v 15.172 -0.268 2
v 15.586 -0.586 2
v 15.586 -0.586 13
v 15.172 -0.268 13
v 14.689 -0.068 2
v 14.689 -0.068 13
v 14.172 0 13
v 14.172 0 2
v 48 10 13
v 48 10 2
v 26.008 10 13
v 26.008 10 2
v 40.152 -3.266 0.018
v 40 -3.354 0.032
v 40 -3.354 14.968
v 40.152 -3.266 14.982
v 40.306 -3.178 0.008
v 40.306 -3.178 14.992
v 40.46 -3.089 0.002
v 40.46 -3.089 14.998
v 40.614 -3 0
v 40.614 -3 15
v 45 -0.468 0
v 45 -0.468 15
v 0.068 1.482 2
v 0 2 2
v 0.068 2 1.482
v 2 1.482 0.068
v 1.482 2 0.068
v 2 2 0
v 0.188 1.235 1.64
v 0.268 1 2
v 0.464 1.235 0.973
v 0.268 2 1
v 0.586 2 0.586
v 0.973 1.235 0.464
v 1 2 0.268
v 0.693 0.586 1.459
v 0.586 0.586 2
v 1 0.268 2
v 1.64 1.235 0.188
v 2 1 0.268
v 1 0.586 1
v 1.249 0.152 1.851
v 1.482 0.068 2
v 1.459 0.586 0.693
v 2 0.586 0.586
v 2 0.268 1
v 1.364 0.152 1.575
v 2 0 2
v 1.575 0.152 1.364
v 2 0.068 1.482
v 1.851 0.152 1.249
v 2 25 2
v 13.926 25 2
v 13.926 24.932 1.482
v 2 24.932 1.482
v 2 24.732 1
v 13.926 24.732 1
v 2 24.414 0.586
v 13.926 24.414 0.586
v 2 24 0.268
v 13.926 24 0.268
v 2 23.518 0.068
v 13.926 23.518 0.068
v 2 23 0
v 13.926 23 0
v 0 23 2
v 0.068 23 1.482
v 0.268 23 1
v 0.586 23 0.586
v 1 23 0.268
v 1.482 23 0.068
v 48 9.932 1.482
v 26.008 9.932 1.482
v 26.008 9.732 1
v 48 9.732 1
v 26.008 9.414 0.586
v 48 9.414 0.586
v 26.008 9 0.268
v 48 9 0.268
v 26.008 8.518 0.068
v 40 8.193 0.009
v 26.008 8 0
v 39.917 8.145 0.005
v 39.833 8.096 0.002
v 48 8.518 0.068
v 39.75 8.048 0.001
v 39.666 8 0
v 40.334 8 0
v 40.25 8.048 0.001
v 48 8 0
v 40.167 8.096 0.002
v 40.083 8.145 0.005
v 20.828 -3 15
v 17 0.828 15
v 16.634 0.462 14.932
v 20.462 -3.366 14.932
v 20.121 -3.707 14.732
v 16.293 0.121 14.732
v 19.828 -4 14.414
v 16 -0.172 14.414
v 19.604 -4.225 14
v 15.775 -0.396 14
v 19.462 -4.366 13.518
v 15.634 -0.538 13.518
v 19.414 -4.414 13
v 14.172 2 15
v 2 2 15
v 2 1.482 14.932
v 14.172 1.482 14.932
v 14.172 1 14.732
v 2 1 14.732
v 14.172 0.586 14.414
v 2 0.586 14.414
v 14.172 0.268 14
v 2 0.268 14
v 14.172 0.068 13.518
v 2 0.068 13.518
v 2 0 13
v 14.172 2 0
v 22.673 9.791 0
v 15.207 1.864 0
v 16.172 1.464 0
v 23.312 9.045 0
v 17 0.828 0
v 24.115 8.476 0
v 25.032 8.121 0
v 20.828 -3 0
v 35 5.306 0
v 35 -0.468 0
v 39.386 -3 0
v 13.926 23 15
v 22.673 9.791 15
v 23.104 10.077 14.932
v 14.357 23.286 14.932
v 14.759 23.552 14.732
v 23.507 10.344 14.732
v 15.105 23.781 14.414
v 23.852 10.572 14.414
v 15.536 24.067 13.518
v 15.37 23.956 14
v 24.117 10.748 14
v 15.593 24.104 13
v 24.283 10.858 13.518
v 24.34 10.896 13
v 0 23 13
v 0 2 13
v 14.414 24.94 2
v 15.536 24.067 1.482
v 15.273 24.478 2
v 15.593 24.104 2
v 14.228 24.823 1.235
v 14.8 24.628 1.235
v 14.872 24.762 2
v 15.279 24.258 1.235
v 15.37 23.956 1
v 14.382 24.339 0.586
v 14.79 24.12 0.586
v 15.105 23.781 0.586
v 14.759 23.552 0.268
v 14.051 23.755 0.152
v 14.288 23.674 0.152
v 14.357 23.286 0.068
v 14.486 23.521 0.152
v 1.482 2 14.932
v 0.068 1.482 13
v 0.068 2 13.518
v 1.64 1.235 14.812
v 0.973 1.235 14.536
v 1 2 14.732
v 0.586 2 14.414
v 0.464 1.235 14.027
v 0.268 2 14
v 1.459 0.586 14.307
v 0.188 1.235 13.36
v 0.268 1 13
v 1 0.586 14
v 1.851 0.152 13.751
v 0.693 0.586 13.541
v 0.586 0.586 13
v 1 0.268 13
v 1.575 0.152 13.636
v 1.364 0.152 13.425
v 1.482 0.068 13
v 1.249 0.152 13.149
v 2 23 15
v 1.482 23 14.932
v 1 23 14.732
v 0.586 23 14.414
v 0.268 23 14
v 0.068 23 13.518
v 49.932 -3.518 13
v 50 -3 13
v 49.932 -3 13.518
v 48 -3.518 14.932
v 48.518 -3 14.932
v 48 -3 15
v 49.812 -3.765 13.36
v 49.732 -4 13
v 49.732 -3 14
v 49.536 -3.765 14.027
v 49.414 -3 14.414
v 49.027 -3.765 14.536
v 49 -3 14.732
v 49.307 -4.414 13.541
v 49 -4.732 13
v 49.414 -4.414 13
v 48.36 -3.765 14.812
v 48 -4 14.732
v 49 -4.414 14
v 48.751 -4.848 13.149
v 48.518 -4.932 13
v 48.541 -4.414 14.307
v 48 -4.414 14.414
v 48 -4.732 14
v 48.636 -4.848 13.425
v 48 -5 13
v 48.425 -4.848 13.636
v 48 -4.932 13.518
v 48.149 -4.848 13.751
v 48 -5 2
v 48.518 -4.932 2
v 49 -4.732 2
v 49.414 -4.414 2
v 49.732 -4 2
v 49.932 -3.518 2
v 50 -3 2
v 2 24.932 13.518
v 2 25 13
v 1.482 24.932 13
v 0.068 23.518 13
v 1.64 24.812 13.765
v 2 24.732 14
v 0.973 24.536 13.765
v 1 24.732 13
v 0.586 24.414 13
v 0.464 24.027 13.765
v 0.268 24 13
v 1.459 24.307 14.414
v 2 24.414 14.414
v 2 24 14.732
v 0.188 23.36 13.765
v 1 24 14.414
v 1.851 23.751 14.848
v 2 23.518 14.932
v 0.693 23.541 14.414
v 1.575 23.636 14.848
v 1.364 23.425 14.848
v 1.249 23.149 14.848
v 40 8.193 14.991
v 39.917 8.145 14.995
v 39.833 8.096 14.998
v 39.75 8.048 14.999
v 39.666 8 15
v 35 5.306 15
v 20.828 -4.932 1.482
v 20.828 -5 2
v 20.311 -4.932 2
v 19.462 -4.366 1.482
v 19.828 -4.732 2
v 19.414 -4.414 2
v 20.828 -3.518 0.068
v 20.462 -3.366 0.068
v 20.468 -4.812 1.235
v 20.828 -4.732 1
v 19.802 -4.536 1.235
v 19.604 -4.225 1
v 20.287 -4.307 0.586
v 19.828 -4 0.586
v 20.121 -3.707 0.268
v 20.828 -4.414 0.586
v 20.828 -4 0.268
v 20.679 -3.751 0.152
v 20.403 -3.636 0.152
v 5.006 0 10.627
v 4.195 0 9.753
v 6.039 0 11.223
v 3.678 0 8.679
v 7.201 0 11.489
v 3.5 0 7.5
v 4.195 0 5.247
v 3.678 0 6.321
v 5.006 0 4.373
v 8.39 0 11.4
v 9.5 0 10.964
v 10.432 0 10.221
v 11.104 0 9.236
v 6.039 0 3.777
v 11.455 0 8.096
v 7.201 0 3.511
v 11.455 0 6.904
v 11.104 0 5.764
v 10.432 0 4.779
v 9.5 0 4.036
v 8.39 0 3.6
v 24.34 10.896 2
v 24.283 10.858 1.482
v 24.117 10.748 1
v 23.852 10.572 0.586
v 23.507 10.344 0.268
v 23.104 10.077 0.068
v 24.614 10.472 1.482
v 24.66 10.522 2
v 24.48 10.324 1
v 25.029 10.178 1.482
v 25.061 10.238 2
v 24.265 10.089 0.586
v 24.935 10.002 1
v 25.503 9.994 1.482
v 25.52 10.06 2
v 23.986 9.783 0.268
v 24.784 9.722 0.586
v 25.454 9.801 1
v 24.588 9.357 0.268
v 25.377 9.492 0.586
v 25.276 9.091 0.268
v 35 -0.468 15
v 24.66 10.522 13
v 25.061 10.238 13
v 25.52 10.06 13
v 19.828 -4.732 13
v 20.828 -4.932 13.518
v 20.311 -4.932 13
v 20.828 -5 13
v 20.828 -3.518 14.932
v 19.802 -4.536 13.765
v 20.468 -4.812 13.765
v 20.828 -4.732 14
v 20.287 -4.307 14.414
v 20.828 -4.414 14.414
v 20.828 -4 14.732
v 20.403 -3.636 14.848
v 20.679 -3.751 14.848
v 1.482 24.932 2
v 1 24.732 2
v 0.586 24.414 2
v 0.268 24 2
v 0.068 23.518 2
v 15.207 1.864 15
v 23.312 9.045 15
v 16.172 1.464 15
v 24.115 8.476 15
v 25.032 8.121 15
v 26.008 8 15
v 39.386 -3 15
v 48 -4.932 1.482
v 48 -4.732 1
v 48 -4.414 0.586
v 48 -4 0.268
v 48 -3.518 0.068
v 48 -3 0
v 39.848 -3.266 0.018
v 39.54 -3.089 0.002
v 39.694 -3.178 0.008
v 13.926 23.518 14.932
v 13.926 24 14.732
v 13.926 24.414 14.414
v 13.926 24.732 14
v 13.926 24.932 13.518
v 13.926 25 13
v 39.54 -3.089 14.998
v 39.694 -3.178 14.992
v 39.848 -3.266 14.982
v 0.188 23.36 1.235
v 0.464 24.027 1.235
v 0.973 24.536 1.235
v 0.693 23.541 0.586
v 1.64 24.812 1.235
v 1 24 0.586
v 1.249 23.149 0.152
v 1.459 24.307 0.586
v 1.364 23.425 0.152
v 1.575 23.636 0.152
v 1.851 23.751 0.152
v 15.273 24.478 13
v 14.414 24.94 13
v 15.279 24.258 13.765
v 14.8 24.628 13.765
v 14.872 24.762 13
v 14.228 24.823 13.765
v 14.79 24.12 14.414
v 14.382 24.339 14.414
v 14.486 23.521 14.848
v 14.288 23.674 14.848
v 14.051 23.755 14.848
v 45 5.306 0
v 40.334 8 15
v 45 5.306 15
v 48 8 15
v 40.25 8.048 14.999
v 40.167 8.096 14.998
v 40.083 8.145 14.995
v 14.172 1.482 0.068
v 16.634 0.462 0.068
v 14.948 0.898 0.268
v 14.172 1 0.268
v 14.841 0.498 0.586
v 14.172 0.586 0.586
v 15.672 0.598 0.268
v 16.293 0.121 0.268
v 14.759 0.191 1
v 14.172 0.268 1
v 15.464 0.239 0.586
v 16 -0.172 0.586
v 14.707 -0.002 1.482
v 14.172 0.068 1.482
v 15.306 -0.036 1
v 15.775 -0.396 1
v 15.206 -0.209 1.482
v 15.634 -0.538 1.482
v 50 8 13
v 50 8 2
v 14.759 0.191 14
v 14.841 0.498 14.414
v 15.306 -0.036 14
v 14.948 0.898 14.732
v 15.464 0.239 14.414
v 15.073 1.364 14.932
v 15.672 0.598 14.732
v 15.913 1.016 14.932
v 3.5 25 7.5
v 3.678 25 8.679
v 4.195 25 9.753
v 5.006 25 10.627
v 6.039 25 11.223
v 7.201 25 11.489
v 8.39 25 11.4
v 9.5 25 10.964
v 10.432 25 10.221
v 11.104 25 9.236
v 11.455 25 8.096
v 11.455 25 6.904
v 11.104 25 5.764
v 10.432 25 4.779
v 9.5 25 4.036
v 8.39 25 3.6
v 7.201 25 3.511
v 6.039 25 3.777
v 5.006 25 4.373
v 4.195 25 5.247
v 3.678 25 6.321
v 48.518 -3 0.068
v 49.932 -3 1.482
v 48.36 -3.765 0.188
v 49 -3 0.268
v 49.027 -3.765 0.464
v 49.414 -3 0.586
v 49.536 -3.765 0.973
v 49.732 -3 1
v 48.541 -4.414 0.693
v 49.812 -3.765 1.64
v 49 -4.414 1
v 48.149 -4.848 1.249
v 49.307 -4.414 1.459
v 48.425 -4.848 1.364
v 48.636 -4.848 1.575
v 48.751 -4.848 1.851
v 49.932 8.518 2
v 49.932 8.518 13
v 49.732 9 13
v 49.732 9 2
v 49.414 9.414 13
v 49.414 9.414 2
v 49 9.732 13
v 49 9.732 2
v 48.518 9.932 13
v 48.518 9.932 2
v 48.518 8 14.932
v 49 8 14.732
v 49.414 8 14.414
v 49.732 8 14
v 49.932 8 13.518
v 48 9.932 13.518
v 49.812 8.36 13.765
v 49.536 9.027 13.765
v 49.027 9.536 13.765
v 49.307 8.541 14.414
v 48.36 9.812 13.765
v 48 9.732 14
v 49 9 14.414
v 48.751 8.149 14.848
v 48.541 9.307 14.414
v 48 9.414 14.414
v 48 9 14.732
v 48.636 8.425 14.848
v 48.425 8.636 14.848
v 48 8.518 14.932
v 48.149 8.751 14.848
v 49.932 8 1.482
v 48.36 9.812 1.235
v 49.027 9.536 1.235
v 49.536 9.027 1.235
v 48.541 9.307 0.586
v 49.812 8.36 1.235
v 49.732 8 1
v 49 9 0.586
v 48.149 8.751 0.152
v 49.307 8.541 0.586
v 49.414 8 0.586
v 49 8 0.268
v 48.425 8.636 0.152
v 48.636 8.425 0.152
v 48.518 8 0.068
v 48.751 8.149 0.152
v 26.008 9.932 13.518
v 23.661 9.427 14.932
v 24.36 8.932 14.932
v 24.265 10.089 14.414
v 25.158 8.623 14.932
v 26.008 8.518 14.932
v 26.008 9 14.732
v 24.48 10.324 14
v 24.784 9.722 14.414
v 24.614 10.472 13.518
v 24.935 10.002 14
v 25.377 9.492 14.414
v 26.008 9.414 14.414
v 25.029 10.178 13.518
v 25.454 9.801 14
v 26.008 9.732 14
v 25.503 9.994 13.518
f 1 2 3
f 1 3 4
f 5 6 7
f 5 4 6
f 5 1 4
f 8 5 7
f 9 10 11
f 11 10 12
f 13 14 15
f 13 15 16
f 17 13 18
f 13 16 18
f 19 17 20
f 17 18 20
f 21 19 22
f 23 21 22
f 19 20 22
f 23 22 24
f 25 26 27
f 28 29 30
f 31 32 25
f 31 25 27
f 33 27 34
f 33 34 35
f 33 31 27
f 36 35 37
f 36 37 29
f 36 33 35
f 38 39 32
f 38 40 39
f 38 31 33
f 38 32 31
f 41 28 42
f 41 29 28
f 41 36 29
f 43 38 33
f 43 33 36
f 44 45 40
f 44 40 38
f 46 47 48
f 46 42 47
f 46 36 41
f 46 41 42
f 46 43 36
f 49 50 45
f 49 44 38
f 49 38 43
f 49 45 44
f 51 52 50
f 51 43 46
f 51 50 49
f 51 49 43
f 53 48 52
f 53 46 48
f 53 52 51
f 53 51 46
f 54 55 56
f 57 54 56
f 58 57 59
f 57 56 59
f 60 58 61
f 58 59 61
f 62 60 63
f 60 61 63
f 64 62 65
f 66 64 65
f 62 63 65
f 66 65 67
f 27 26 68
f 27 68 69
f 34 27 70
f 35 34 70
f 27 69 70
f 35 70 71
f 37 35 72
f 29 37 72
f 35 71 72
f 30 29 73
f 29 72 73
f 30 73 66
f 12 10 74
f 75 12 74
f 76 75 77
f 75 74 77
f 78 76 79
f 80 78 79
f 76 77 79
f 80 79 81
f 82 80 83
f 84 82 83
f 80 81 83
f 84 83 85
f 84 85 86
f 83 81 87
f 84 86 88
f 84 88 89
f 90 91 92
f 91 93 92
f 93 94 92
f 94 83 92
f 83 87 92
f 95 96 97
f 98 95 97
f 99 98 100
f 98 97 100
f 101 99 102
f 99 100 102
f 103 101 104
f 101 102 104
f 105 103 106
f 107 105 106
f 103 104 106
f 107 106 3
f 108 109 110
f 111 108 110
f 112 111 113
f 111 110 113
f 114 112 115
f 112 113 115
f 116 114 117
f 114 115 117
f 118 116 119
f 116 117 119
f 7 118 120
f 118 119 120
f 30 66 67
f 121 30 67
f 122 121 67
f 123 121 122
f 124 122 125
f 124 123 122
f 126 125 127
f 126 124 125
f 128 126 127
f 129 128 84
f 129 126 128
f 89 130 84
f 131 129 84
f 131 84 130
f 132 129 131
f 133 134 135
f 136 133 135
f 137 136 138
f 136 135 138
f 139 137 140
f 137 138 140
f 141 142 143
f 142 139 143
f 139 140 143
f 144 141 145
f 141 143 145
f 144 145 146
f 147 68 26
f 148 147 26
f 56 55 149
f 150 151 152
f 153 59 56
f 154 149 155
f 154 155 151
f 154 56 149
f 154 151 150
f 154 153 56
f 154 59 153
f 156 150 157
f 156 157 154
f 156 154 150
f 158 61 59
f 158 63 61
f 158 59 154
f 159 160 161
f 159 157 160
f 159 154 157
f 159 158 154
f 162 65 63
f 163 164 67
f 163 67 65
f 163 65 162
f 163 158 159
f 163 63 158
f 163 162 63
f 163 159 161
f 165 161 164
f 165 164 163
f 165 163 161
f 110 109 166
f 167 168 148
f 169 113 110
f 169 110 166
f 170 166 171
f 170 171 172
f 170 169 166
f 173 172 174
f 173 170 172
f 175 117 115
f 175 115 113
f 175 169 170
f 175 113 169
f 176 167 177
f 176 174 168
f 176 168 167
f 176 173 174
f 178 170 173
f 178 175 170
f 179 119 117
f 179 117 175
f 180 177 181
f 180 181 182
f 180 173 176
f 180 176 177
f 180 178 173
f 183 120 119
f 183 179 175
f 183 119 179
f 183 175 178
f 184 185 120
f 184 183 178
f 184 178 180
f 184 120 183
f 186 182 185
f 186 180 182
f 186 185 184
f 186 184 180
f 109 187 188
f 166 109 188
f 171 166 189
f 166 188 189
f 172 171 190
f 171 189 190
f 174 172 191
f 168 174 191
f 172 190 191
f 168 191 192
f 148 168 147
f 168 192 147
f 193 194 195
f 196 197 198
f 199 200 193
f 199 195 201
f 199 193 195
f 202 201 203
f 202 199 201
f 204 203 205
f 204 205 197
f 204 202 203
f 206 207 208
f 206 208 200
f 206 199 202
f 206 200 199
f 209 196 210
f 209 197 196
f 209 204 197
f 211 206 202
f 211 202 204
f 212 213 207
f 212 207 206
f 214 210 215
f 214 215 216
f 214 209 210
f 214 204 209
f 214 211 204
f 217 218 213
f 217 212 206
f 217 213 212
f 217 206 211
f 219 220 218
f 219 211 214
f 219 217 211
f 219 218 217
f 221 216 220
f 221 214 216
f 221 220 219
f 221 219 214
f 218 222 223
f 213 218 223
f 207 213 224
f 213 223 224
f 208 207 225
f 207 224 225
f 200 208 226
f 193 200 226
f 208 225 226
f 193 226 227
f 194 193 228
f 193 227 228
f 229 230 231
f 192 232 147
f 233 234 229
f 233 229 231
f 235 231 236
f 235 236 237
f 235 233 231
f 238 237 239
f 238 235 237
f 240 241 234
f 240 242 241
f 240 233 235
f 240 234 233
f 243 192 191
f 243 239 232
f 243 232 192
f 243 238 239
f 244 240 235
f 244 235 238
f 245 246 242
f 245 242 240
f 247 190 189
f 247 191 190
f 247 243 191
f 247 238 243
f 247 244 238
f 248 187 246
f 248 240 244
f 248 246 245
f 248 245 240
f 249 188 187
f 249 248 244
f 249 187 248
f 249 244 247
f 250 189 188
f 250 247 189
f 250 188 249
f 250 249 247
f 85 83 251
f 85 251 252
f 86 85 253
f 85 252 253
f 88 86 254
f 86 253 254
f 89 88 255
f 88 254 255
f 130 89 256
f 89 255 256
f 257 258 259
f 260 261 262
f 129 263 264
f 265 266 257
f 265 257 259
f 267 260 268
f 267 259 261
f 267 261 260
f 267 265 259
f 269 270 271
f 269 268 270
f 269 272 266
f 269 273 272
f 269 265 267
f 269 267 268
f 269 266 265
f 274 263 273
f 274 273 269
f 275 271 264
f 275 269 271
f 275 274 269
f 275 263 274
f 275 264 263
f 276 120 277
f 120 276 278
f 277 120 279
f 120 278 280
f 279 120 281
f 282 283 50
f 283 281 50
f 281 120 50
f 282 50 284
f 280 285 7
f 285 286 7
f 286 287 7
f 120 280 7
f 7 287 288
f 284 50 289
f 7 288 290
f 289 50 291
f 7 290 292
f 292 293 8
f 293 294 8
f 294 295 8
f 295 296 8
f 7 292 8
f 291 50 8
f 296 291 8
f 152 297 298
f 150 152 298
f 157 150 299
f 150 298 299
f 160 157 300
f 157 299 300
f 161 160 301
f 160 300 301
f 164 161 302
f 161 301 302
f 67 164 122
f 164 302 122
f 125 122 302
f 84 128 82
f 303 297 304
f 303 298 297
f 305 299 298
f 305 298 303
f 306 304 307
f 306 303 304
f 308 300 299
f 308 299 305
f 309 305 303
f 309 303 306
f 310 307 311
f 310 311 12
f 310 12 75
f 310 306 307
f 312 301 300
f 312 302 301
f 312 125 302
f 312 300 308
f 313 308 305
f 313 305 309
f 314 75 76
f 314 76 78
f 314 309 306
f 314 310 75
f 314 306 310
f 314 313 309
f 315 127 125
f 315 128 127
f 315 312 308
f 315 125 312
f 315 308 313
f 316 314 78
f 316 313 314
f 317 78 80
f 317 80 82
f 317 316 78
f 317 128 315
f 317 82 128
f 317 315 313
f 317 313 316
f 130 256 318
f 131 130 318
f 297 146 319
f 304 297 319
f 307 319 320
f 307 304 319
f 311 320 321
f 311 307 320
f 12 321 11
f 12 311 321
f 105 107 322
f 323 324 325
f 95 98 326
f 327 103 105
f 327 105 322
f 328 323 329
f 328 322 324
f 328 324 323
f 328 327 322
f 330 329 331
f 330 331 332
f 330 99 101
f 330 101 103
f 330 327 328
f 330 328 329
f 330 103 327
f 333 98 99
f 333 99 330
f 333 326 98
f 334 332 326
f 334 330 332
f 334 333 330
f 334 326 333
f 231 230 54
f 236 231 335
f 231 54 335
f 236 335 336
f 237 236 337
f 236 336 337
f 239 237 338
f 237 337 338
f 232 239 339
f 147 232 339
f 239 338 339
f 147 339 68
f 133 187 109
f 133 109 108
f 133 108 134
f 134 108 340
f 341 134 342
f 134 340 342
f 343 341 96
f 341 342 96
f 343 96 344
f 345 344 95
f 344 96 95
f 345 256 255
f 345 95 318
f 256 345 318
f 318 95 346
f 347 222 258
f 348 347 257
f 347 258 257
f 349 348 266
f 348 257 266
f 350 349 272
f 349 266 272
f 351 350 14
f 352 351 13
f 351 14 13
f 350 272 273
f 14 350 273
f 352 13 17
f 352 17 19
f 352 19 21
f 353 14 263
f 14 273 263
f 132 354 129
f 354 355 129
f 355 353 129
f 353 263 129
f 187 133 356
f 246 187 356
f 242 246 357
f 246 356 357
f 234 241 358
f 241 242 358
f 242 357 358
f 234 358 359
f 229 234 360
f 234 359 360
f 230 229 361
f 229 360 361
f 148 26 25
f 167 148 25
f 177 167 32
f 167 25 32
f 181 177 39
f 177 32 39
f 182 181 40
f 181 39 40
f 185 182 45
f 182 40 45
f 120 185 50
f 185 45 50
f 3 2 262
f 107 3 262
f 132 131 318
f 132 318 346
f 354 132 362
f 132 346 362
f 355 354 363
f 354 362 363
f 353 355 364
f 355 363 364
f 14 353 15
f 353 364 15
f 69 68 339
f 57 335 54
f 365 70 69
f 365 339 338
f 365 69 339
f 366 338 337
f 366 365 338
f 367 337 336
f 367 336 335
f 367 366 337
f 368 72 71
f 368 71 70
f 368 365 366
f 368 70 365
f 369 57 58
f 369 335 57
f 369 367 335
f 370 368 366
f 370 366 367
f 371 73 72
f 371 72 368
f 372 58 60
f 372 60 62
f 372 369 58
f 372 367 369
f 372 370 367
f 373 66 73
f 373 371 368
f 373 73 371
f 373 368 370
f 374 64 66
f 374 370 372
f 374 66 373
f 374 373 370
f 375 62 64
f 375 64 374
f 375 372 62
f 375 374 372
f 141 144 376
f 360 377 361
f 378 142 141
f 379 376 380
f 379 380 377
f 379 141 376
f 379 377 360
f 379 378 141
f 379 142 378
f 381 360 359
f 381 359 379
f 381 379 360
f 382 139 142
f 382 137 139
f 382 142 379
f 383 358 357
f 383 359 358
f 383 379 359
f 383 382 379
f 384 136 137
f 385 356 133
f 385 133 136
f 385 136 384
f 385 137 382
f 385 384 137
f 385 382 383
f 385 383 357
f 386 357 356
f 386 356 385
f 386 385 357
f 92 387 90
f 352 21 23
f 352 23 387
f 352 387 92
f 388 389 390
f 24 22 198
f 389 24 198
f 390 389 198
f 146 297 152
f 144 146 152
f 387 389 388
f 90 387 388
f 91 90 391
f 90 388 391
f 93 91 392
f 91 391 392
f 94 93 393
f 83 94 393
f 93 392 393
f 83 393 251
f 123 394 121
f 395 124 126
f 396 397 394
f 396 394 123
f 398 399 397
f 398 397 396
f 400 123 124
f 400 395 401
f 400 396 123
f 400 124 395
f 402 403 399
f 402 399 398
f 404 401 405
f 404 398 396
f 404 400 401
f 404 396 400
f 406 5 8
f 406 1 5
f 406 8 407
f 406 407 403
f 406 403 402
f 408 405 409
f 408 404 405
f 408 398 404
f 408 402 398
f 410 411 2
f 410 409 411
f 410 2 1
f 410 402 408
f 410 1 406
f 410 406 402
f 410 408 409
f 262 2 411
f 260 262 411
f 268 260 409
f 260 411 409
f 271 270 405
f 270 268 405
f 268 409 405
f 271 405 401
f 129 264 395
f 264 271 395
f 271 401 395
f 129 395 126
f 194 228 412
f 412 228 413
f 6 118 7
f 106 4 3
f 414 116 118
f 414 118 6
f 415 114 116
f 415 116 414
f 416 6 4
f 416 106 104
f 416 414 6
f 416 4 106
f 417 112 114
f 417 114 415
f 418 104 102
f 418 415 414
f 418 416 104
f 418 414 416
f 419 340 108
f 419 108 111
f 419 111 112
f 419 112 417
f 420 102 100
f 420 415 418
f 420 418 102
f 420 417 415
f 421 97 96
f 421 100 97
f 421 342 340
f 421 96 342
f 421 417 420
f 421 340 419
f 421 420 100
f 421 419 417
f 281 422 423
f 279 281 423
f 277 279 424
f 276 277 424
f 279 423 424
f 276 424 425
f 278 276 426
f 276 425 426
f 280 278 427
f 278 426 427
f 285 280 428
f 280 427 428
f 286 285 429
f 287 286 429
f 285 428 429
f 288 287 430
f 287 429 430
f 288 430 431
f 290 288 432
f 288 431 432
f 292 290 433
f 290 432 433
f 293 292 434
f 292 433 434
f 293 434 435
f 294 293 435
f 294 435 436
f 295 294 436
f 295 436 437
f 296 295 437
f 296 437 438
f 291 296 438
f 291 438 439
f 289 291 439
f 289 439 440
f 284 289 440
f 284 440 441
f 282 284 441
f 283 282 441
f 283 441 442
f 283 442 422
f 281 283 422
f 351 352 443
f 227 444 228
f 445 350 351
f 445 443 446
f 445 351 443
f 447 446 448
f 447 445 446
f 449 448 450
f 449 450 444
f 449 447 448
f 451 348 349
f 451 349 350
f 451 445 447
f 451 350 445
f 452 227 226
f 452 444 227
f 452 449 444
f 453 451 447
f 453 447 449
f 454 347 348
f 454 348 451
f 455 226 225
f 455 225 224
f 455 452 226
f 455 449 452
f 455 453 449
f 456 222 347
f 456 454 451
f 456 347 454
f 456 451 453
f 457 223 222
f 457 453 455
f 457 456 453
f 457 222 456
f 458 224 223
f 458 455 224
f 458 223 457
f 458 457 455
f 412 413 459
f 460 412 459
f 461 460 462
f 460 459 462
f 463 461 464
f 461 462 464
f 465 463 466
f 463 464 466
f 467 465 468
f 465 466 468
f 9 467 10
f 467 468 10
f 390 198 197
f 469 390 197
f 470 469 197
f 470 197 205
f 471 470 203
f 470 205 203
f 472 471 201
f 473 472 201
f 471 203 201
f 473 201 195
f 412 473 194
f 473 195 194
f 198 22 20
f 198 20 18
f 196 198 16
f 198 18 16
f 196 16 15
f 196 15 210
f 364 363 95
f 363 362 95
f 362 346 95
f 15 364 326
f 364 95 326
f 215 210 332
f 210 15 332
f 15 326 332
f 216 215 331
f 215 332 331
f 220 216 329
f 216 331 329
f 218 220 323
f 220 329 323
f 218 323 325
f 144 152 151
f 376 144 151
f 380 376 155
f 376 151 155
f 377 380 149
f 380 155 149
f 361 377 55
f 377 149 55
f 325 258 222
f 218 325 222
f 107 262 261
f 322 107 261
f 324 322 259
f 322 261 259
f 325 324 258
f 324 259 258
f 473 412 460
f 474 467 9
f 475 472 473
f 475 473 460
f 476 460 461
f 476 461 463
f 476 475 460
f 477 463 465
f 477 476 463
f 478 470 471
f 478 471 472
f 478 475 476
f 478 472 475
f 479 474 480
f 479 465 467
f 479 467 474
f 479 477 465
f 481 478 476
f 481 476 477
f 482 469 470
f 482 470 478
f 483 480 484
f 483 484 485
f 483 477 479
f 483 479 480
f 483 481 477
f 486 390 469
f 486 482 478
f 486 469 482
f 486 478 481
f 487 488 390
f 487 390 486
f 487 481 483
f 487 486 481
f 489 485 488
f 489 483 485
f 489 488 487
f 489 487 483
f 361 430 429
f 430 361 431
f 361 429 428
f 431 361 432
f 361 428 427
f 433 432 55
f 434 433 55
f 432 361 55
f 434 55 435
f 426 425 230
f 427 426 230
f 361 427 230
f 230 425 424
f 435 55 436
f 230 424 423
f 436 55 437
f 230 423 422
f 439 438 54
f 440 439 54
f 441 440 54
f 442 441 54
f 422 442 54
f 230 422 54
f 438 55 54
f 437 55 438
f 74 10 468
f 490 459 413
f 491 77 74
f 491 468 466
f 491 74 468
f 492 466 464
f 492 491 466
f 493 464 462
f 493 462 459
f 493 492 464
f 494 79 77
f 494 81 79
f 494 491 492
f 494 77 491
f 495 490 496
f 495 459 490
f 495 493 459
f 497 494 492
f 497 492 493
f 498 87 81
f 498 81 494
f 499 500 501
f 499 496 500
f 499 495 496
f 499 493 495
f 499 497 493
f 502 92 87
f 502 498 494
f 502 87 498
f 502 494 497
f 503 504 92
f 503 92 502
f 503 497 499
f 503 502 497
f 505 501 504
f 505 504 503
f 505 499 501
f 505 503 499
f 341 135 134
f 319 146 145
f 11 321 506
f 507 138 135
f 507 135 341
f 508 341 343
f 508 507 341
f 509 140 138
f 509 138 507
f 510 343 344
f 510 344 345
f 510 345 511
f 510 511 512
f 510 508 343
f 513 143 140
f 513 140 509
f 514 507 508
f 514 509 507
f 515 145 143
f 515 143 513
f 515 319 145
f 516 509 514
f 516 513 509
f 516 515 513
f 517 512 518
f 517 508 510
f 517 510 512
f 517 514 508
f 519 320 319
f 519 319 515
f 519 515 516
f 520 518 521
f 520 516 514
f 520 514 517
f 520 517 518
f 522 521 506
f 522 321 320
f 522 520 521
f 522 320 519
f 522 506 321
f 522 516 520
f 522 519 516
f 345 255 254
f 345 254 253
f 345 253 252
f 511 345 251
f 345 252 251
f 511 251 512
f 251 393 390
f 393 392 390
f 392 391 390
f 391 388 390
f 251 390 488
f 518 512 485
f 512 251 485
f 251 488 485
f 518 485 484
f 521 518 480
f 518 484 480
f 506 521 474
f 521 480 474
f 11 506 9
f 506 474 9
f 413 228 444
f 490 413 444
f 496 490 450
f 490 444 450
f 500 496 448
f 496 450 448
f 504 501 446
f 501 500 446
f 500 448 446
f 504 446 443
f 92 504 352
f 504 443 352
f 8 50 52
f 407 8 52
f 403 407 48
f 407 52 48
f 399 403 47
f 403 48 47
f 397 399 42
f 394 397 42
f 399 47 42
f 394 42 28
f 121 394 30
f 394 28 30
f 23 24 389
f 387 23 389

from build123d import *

# Parameters (mm, degrees)
BOSS_EXTRUDE1_DEPTH = 15
SKETCH2_R           = 4.000000000000001
CUT_EXTRUDE1_DEPTH  = 61.20797289396146
CUT_EXTRUDE2_DEPTH  = 15
FILLET1_R           = 2


with BuildPart() as part:
    # Sketch1 → Boss-Extrude1 (new body)
    with BuildSketch(Plane.XY):
        Polygon((0, 0), (15, 0), (19.999999999999982, -5), (49.99999999999999, -5), (49.999999999999986, 10.000000000000002), (24.93349002823336, 9.999999999999998), (15, 24.999999999999993), (0, 24.999999999999996), align=None)
    extrude(amount=BOSS_EXTRUDE1_DEPTH)

    # Sketch2 → Cut-Extrude1 (cut, through all)
    with BuildSketch(Plane(origin=(5.78e-15, 24.999999999999996, 0), x_dir=(1, -2.3e-16, 0), z_dir=(2.3e-16, 1, 0))):
        with Locations(Location((7.499999999999995, -7.5, 0), (0, 0, 180))):
            Circle(SKETCH2_R)
    extrude(amount=-CUT_EXTRUDE1_DEPTH, mode=Mode.SUBTRACT)

    # Sketch3 → Cut-Extrude2 (cut)
    with BuildSketch(Plane.XY.offset(15)):
        Polygon((45, -0.4675632330808986), (45, 5.305939458815377), (39.99999999999999, 8.192690804763508), (34.999999999999986, 5.305939458815372), (34.999999999999986, -0.46756323308090486), (39.999999999999986, -3.354314579029036), align=None)
    extrude(amount=-CUT_EXTRUDE2_DEPTH, mode=Mode.SUBTRACT)

    # Fillet1
    # the kernel refuses this fillet: 2 mm, written as the material it adds along each edge
    with BuildSketch(Plane(origin=(24.93349002823336, 9.999999999999998, 0), x_dir=(-0.5521382091872268, 0.8337525999692728, 0), z_dir=(0, 0, 1))) as fillet1_piece_1:
        with BuildLine():
            CenterArc((FILLET1_R * 0.537163891098, -FILLET1_R), FILLET1_R, 90.00000000000004, 56.486172927445)
            Line((-FILLET1_R * 0.296588708871, -FILLET1_R * 0.447861790813), (0, 0))
            Line((0, 0), (FILLET1_R * 0.537163891098, -7e-17))
        make_face()
    extrude(amount=15)
    with BuildSketch(Plane(origin=(15, 0, 0), x_dir=(-1, 0, 0), z_dir=(0, 0, 1))) as fillet1_piece_2:
        with BuildLine():
            CenterArc((FILLET1_R * 0.414213562373, FILLET1_R), FILLET1_R, 224.99999999999994, 45.00000000000006)
            Line((-FILLET1_R * 0.292893218813, FILLET1_R * 0.292893218813), (0, 0))
            Line((0, 0), (FILLET1_R * 0.414213562373, 0))
        make_face()
    extrude(amount=15)
    # the kernel refuses this fillet: 2 mm, written as the material it takes off along each edge
    with BuildSketch(Plane(origin=(2, 2, 13), x_dir=(0, 0, 1), z_dir=(0, -1, 0))) as fillet1_2_piece_1_section:
        Polygon((0, 0), (FILLET1_R, 0), (FILLET1_R, FILLET1_R), (0, FILLET1_R), align=None)
    fillet1_2_piece_1 = extrude(amount=FILLET1_R, mode=Mode.PRIVATE)
    fillet1_2_piece_1 = fillet1_2_piece_1 - Plane(origin=(2, 2, 13), x_dir=(0.7071067811865475, 0, -0.7071067811865475), z_dir=(0, -1, 0)) * Sphere(FILLET1_R, mode=Mode.PRIVATE)
    add(fillet1_2_piece_1, mode=Mode.SUBTRACT)
    with BuildSketch(Plane(origin=(2, 22.999999999999996, 2), x_dir=(-1, 0, 0), z_dir=(0, 0, -1))) as fillet1_2_piece_2_section:
        Polygon((0, 0), (FILLET1_R, 0), (FILLET1_R, FILLET1_R), (-4.7e-16, FILLET1_R), align=None)
    fillet1_2_piece_2 = extrude(amount=FILLET1_R, mode=Mode.PRIVATE)
    fillet1_2_piece_2 = fillet1_2_piece_2 - Plane(origin=(2, 22.999999999999996, 2), x_dir=(0.7071067811865475, -0.7071067811865476, 0), z_dir=(0, 0, -1)) * Sphere(FILLET1_R, mode=Mode.PRIVATE)
    add(fillet1_2_piece_2, mode=Mode.SUBTRACT)
    with BuildSketch(Plane(origin=(2, 2, 2), x_dir=(0, 0, -1), z_dir=(0, -1, 0))) as fillet1_2_piece_3_section:
        Polygon((0, 0), (FILLET1_R, 0), (FILLET1_R, -FILLET1_R), (0, -FILLET1_R), align=None)
    fillet1_2_piece_3 = extrude(amount=FILLET1_R, mode=Mode.PRIVATE)
    fillet1_2_piece_3 = fillet1_2_piece_3 - Plane(origin=(2, 2, 2), x_dir=(0.7071067811865475, 0, 0.7071067811865475), z_dir=(0, -1, 0)) * Sphere(FILLET1_R, mode=Mode.PRIVATE)
    add(fillet1_2_piece_3, mode=Mode.SUBTRACT)
    with BuildSketch(Plane(origin=(13.92567221780351, 22.999999999999993, 2), x_dir=(0.8337525999692725, 0.5521382091872273, 0), z_dir=(0, 0, -1))) as fillet1_2_piece_4_section:
        Polygon((0, 0), (FILLET1_R, -3e-17), (FILLET1_R, -FILLET1_R * 0.537163891098), (FILLET1_R * 0.552138209187, -FILLET1_R * 0.833752599969), align=None)
    fillet1_2_piece_4 = extrude(amount=FILLET1_R, mode=Mode.PRIVATE)
    fillet1_2_piece_4 = fillet1_2_piece_4 - Plane(origin=(13.92567221780351, 22.999999999999993, 2), x_dir=(-0.47321337196489544, -0.8809478444230473, 0), z_dir=(0, 0, -1)) * Sphere(FILLET1_R, mode=Mode.PRIVATE)
    add(fillet1_2_piece_4, mode=Mode.SUBTRACT)
    with BuildSketch(Plane(origin=(20.828427124746174, -3, 13), x_dir=(-0.7071067811865488, -0.7071067811865462, 0), z_dir=(0, 0, 1))) as fillet1_2_piece_5_section:
        Polygon((0, 0), (FILLET1_R, -2e-17), (FILLET1_R, FILLET1_R * 0.414213562373), (FILLET1_R * 0.707106781187, FILLET1_R * 0.707106781187), align=None)
    fillet1_2_piece_5 = extrude(amount=FILLET1_R, mode=Mode.PRIVATE)
    fillet1_2_piece_5 = fillet1_2_piece_5 - Plane(origin=(20.828427124746174, -3, 13), x_dir=(0.3826834323650906, 0.9238795325112864, 0), z_dir=(0, 0, 1)) * Sphere(FILLET1_R, mode=Mode.PRIVATE)
    add(fillet1_2_piece_5, mode=Mode.SUBTRACT)
    with BuildSketch(Plane(origin=(13.925672217803509, 22.999999999999996, 13), x_dir=(2.4e-16, 1, 0), z_dir=(0, 0, 1))) as fillet1_2_piece_6_section:
        Polygon((0, 0), (FILLET1_R, 0), (FILLET1_R, -FILLET1_R * 0.537163891098), (FILLET1_R * 0.552138209187, -FILLET1_R * 0.833752599969), align=None)
    fillet1_2_piece_6 = extrude(amount=FILLET1_R, mode=Mode.PRIVATE)
    fillet1_2_piece_6 = fillet1_2_piece_6 - Plane(origin=(13.925672217803509, 22.999999999999996, 13), x_dir=(-0.47321337196489544, -0.8809478444230473, 0), z_dir=(0, 0, 1)) * Sphere(FILLET1_R, mode=Mode.PRIVATE)
    add(fillet1_2_piece_6, mode=Mode.SUBTRACT)
    with BuildSketch(Plane(origin=(47.999999999999986, 8.000000000000002, 2), x_dir=(1, 4.7e-16, 0), z_dir=(0, 0, -1))) as fillet1_2_piece_7_section:
        Polygon((0, 0), (FILLET1_R, 0), (FILLET1_R, -FILLET1_R), (6.6e-16, -FILLET1_R), align=None)
    fillet1_2_piece_7 = extrude(amount=FILLET1_R, mode=Mode.PRIVATE)
    fillet1_2_piece_7 = fillet1_2_piece_7 - Plane(origin=(47.999999999999986, 8.000000000000002, 2), x_dir=(-0.7071067811865472, -0.7071067811865477, 0), z_dir=(0, 0, -1)) * Sphere(FILLET1_R, mode=Mode.PRIVATE)
    add(fillet1_2_piece_7, mode=Mode.SUBTRACT)
    with BuildSketch(Plane(origin=(47.999999999999986, 8.000000000000002, 13), x_dir=(1, 4.7e-16, 0), z_dir=(0, 0, 1))) as fillet1_2_piece_8_section:
        Polygon((0, 0), (FILLET1_R, 0), (FILLET1_R, FILLET1_R), (6.6e-16, FILLET1_R), align=None)
    fillet1_2_piece_8 = extrude(amount=FILLET1_R, mode=Mode.PRIVATE)
    fillet1_2_piece_8 = fillet1_2_piece_8 - Plane(origin=(47.999999999999986, 8.000000000000002, 13), x_dir=(-0.7071067811865472, -0.7071067811865477, 0), z_dir=(0, 0, 1)) * Sphere(FILLET1_R, mode=Mode.PRIVATE)
    add(fillet1_2_piece_8, mode=Mode.SUBTRACT)
    with BuildSketch(Plane(origin=(47.99999999999999, -3, 2), x_dir=(0, 0, -1), z_dir=(0, -1, 0))) as fillet1_2_piece_9_section:
        Polygon((0, 0), (FILLET1_R, 0), (FILLET1_R, FILLET1_R), (0, FILLET1_R), align=None)
    fillet1_2_piece_9 = extrude(amount=FILLET1_R, mode=Mode.PRIVATE)
    fillet1_2_piece_9 = fillet1_2_piece_9 - Plane(origin=(47.99999999999999, -3, 2), x_dir=(-0.7071067811865475, 0, 0.7071067811865475), z_dir=(0, -1, 0)) * Sphere(FILLET1_R, mode=Mode.PRIVATE)
    add(fillet1_2_piece_9, mode=Mode.SUBTRACT)
    with BuildSketch(Plane(origin=(47.99999999999999, -3, 13), x_dir=(1, 4.7e-16, 0), z_dir=(0, -1, 0))) as fillet1_2_piece_10_section:
        Polygon((0, 0), (FILLET1_R, 0), (FILLET1_R, FILLET1_R), (0, FILLET1_R), align=None)
    fillet1_2_piece_10 = extrude(amount=FILLET1_R, mode=Mode.PRIVATE)
    fillet1_2_piece_10 = fillet1_2_piece_10 - Plane(origin=(47.99999999999999, -3, 13), x_dir=(-0.7071067811865475, 0, -0.7071067811865475), z_dir=(0, -1, 0)) * Sphere(FILLET1_R, mode=Mode.PRIVATE)
    add(fillet1_2_piece_10, mode=Mode.SUBTRACT)
    with BuildSketch(Plane(origin=(20.828427124746174, -3, 2), x_dir=(-0.7071067811865488, -0.7071067811865462, 0), z_dir=(0, 0, -1))) as fillet1_2_piece_11_section:
        Polygon((0, 0), (FILLET1_R, 2e-17), (FILLET1_R, -FILLET1_R * 0.414213562373), (FILLET1_R * 0.707106781187, -FILLET1_R * 0.707106781187), align=None)
    fillet1_2_piece_11 = extrude(amount=FILLET1_R, mode=Mode.PRIVATE)
    fillet1_2_piece_11 = fillet1_2_piece_11 - Plane(origin=(20.828427124746174, -3, 2), x_dir=(0.3826834323650906, 0.9238795325112864, 0), z_dir=(0, 0, -1)) * Sphere(FILLET1_R, mode=Mode.PRIVATE)
    add(fillet1_2_piece_11, mode=Mode.SUBTRACT)
    with BuildSketch(Plane(origin=(2, 22.999999999999996, 13), x_dir=(-1, 0, 0), z_dir=(0, 0, 1))) as fillet1_2_piece_12_section:
        Polygon((0, 0), (FILLET1_R, 0), (FILLET1_R, -FILLET1_R), (-4.7e-16, -FILLET1_R), align=None)
    fillet1_2_piece_12 = extrude(amount=FILLET1_R, mode=Mode.PRIVATE)
    fillet1_2_piece_12 = fillet1_2_piece_12 - Plane(origin=(2, 22.999999999999996, 13), x_dir=(0.7071067811865475, -0.7071067811865476, 0), z_dir=(0, 0, 1)) * Sphere(FILLET1_R, mode=Mode.PRIVATE)
    add(fillet1_2_piece_12, mode=Mode.SUBTRACT)
    with BuildSketch(Plane(origin=(1.9999999999999998, 0, 15), x_dir=(0, 0, -1), z_dir=(1, 0, 0))) as fillet1_2_piece_13:
        with BuildLine():
            CenterArc((FILLET1_R, FILLET1_R), FILLET1_R, 180, 90)
            Line((0, FILLET1_R), (0, 0))
            Line((0, 0), (FILLET1_R, 0))
        make_face()
    extrude(amount=12.171572875253808, mode=Mode.SUBTRACT)
    with BuildSketch(Plane(origin=(0, 22.999999999999996, 0), x_dir=(1, 0, 0), z_dir=(0, -1, 0))) as fillet1_2_piece_14:
        with BuildLine():
            CenterArc((FILLET1_R, FILLET1_R), FILLET1_R, 180, 90)
            Line((0, FILLET1_R), (0, 0))
            Line((0, 0), (FILLET1_R, 0))
        make_face()
    extrude(amount=20.999999999999996, mode=Mode.SUBTRACT)
    with BuildSketch(Plane(origin=(13.92567221780351, 24.999999999999993, 0), x_dir=(-2.4e-16, -1, 0), z_dir=(-1, 2.4e-16, 0))) as fillet1_2_piece_15:
        with BuildLine():
            CenterArc((FILLET1_R, FILLET1_R), FILLET1_R, 180, 90)
            Line((0, FILLET1_R), (0, 0))
            Line((0, 0), (FILLET1_R, 0))
        make_face()
    extrude(amount=11.92567221780351, mode=Mode.SUBTRACT)
    with BuildSketch(Plane(origin=(15.585786437626904, -0.5857864376269062, 15), x_dir=(0.7071067811865488, 0.7071067811865462, 0), z_dir=(0.7071067811865462, -0.7071067811865488, 0))) as fillet1_2_piece_16:
        with BuildLine():
            CenterArc((FILLET1_R, -FILLET1_R), FILLET1_R, 90, 90)
            Line((-1.88e-15, -FILLET1_R), (0, 0))
            Line((0, 0), (FILLET1_R, 0))
        make_face()
    extrude(amount=5.4142135623730825, mode=Mode.SUBTRACT)
    with BuildSketch(Plane(origin=(15, 24.999999999999993, 2), x_dir=(-1, 0, 0), z_dir=(0, 0, 1))) as fillet1_2_piece_17:
        with BuildLine():
            CenterArc((FILLET1_R * 0.537163891098, FILLET1_R), FILLET1_R, 213.5138270725551, 56.4861729274449)
            Line((-FILLET1_R * 0.296588708871, FILLET1_R * 0.447861790813), (0, 0))
            Line((0, 0), (FILLET1_R * 0.537163891098, 0))
        make_face()
    extrude(amount=11, mode=Mode.SUBTRACT)
    with BuildSketch(Plane(origin=(49.999999999999986, 10.000000000000002, 2), x_dir=(0, -1, 0), z_dir=(0, 0, 1))) as fillet1_2_piece_18:
        with BuildLine():
            CenterArc((FILLET1_R, -FILLET1_R), FILLET1_R, 90.00000000000006, 89.99999999999994)
            Line((1.78e-15, -FILLET1_R), (0, 0))
            Line((0, 0), (FILLET1_R, 0))
        make_face()
    extrude(amount=11, mode=Mode.SUBTRACT)
    with BuildSketch(Plane(origin=(49.99999999999999, -5, 2), x_dir=(-1, 0, 0), z_dir=(0, 0, 1))) as fillet1_2_piece_19:
        with BuildLine():
            CenterArc((FILLET1_R, -FILLET1_R), FILLET1_R, 90, 90)
            Line((0, -FILLET1_R), (0, 0))
            Line((0, 0), (FILLET1_R, 0))
        make_face()
    extrude(amount=11, mode=Mode.SUBTRACT)
    with BuildSketch(Plane(origin=(19.999999999999982, -5, 2), x_dir=(-0.7071067811865454, 0.7071067811865497, 0), z_dir=(0, 0, 1))) as fillet1_2_piece_20:
        with BuildLine():
            CenterArc((FILLET1_R * 0.414213562373, -FILLET1_R), FILLET1_R, 90.00000000000001, 45.00000000000007)
            Line((-FILLET1_R * 0.292893218813, -FILLET1_R * 0.292893218813), (0, 0))
            Line((0, 0), (FILLET1_R * 0.414213562373, 1e-17))
        make_face()
    extrude(amount=11, mode=Mode.SUBTRACT)
    with BuildSketch(Plane(origin=(0, 0, 2), x_dir=(1, 0, 0), z_dir=(0, 0, 1))) as fillet1_2_piece_21:
        with BuildLine():
            CenterArc((FILLET1_R, FILLET1_R), FILLET1_R, 180, 90)
            Line((-2.2e-16, FILLET1_R), (0, 0))
            Line((0, 0), (FILLET1_R, 0))
        make_face()
    extrude(amount=11, mode=Mode.SUBTRACT)
    with BuildSketch(Plane(origin=(0, 24.999999999999996, 2), x_dir=(0, -1, 0), z_dir=(0, 0, 1))) as fillet1_2_piece_22:
        with BuildLine():
            CenterArc((FILLET1_R, FILLET1_R), FILLET1_R, 180, 90)
            Line((0, FILLET1_R), (0, 0))
            Line((0, 0), (FILLET1_R, 0))
        make_face()
    extrude(amount=11, mode=Mode.SUBTRACT)
    with BuildSketch(Plane(origin=(20.828427124746174, -5, 15), x_dir=(0, 1, 0), z_dir=(1, 0, 0))) as fillet1_2_piece_23:
        with BuildLine():
            CenterArc((FILLET1_R, -FILLET1_R), FILLET1_R, 90, 90)
            Line((8.9e-16, -FILLET1_R), (0, 0))
            Line((0, 0), (FILLET1_R, 0))
        make_face()
    extrude(amount=27.17157287525382, mode=Mode.SUBTRACT)
    with BuildSketch(Plane(origin=(49.99999999999999, -2.999999999999999, 15), x_dir=(-1, -4.7e-16, 0), z_dir=(-4.7e-16, 1, 0))) as fillet1_2_piece_24:
        with BuildLine():
            CenterArc((FILLET1_R, -FILLET1_R), FILLET1_R, 90, 90)
            Line((0, -FILLET1_R), (0, 0))
            Line((0, 0), (FILLET1_R, 0))
        make_face()
    extrude(amount=11.000000000000004, mode=Mode.SUBTRACT)
    with BuildSketch(Plane(origin=(47.999999999999986, 10.000000000000002, 15), x_dir=(1.4e-16, -1, 0), z_dir=(-1, -1.4e-16, 0))) as fillet1_2_piece_25:
        with BuildLine():
            CenterArc((FILLET1_R, -FILLET1_R), FILLET1_R, 90, 90)
            Line((0, -FILLET1_R), (0, 0))
            Line((0, 0), (FILLET1_R, 0))
        make_face()
    extrude(amount=21.992182189570133, mode=Mode.SUBTRACT)
    with BuildSketch(Plane(origin=(24.340312610491306, 10.895723581625546, 15), x_dir=(-0.8337525999692724, -0.5521382091872273, 0), z_dir=(-0.5521382091872273, 0.8337525999692725, 0))) as fillet1_2_piece_26:
        with BuildLine():
            CenterArc((FILLET1_R, -FILLET1_R), FILLET1_R, 90, 90)
            Line((-9.8e-16, -FILLET1_R), (0, 0))
            Line((0, 0), (FILLET1_R, 0))
        make_face()
    extrude(amount=15.842292830314058, mode=Mode.SUBTRACT)
    with BuildSketch(Plane(origin=(13.925672217803509, 24.999999999999993, 15), x_dir=(-2.4e-16, -1, 0), z_dir=(-1, 2.4e-16, 0))) as fillet1_2_piece_27:
        with BuildLine():
            CenterArc((FILLET1_R, -FILLET1_R), FILLET1_R, 90, 90)
            Line((0, -FILLET1_R), (0, 0))
            Line((0, 0), (FILLET1_R, 0))
        make_face()
    extrude(amount=11.925672217803509, mode=Mode.SUBTRACT)
    with BuildSketch(Plane(origin=(0, 22.999999999999996, 15), x_dir=(1, 0, 0), z_dir=(0, -1, 0))) as fillet1_2_piece_28:
        with BuildLine():
            CenterArc((FILLET1_R, -FILLET1_R), FILLET1_R, 90, 90)
            Line((0, -FILLET1_R), (0, 0))
            Line((0, 0), (FILLET1_R, 0))
        make_face()
    extrude(amount=20.999999999999996, mode=Mode.SUBTRACT)
    with BuildSketch(Plane(origin=(24.340312610491306, 10.895723581625546, 0), x_dir=(-0.8337525999692724, -0.5521382091872273, 0), z_dir=(-0.5521382091872273, 0.8337525999692725, 0))) as fillet1_2_piece_29:
        with BuildLine():
            CenterArc((FILLET1_R, FILLET1_R), FILLET1_R, 180, 90)
            Line((-9.8e-16, FILLET1_R), (0, 0))
            Line((0, 0), (FILLET1_R, 0))
        make_face()
    extrude(amount=15.84229283031405, mode=Mode.SUBTRACT)
    with BuildSketch(Plane(origin=(47.999999999999986, 10.000000000000002, 0), x_dir=(1.4e-16, -1, 0), z_dir=(-1, -1.4e-16, 0))) as fillet1_2_piece_30:
        with BuildLine():
            CenterArc((FILLET1_R, FILLET1_R), FILLET1_R, 180, 90)
            Line((0, FILLET1_R), (0, 0))
            Line((0, 0), (FILLET1_R, 0))
        make_face()
    extrude(amount=21.992182189570133, mode=Mode.SUBTRACT)
    with BuildSketch(Plane(origin=(49.99999999999999, -2.999999999999999, 0), x_dir=(-1, -4.7e-16, 0), z_dir=(-4.7e-16, 1, 0))) as fillet1_2_piece_31:
        with BuildLine():
            CenterArc((FILLET1_R, FILLET1_R), FILLET1_R, 180, 90)
            Line((0, FILLET1_R), (0, 0))
            Line((0, 0), (FILLET1_R, 0))
        make_face()
    extrude(amount=11.000000000000004, mode=Mode.SUBTRACT)
    with BuildSketch(Plane(origin=(20.828427124746174, -5, 0), x_dir=(0, 1, 0), z_dir=(1, 0, 0))) as fillet1_2_piece_32:
        with BuildLine():
            CenterArc((FILLET1_R, FILLET1_R), FILLET1_R, 180, 90)
            Line((8.9e-16, FILLET1_R), (0, 0))
            Line((0, 0), (FILLET1_R, 0))
        make_face()
    extrude(amount=27.17157287525382, mode=Mode.SUBTRACT)
    with BuildSketch(Plane(origin=(15.585786437626904, -0.5857864376269062, 0), x_dir=(0.7071067811865488, 0.7071067811865462, 0), z_dir=(0.7071067811865462, -0.7071067811865488, 0))) as fillet1_2_piece_33:
        with BuildLine():
            CenterArc((FILLET1_R, FILLET1_R), FILLET1_R, 180, 90)
            Line((-1.88e-15, FILLET1_R), (0, 0))
            Line((0, 0), (FILLET1_R, 0))
        make_face()
    extrude(amount=5.4142135623730825, mode=Mode.SUBTRACT)
    with BuildSketch(Plane(origin=(1.9999999999999998, 0, 0), x_dir=(0, 0, 1), z_dir=(1, 0, 0))) as fillet1_2_piece_34:
        with BuildLine():
            CenterArc((FILLET1_R, -FILLET1_R), FILLET1_R, 90, 90)
            Line((-2.2e-16, -FILLET1_R), (0, 0))
            Line((0, 0), (FILLET1_R, 0))
        make_face()
    extrude(amount=12.171572875253808, mode=Mode.SUBTRACT)
    with BuildSketch(Plane(origin=(14.171572875253808, -2, 0), x_dir=(0, 1, 0), z_dir=(-1, 0, 0))) as fillet1_2_piece_35:
        with BuildLine():
            CenterArc((2 + FILLET1_R, -FILLET1_R), FILLET1_R, 90, 90)
            Line((2, -FILLET1_R), (2, 0))
            Line((2, 0), (2 + FILLET1_R, 0))
        make_face()
    revolve(axis=Axis((14.171572875253808, -2, 0), (0, 0, -1)), revolution_arc=45.00000000000004, mode=Mode.SUBTRACT)
    with BuildSketch(Plane(origin=(26.007817810429852, 12, 0), x_dir=(-0.8337525999692728, -0.5521382091872268, 0), z_dir=(-0.5521382091872268, 0.8337525999692728, 0))) as fillet1_2_piece_36:
        with BuildLine():
            CenterArc((2.0000000000000004 + FILLET1_R, FILLET1_R), FILLET1_R, 180, 90)
            Line((1.9999999999999996, FILLET1_R), (2.0000000000000004, 0))
            Line((2.0000000000000004, 0), (2.0000000000000004 + FILLET1_R, 0))
        make_face()
    revolve(axis=Axis((26.007817810429852, 12, 0), (0, 0, 1)), revolution_arc=56.486172927445004, mode=Mode.SUBTRACT)
    with BuildSketch(Plane(origin=(26.007817810429852, 12, 15), x_dir=(-0.8337525999692728, -0.5521382091872268, 0), z_dir=(-0.5521382091872268, 0.8337525999692728, 0))) as fillet1_2_piece_37:
        with BuildLine():
            CenterArc((2.0000000000000004 + FILLET1_R, -FILLET1_R), FILLET1_R, 90, 90)
            Line((1.9999999999999996, -FILLET1_R), (2.0000000000000004, 0))
            Line((2.0000000000000004, 0), (2.0000000000000004 + FILLET1_R, 0))
        make_face()
    revolve(axis=Axis((26.007817810429852, 12, 15), (0, 0, 1)), revolution_arc=56.486172927445004, mode=Mode.SUBTRACT)
    with BuildSketch(Plane(origin=(14.171572875253808, -2, 15), x_dir=(0, 1, 0), z_dir=(-1, 0, 0))) as fillet1_2_piece_38:
        with BuildLine():
            CenterArc((2 + FILLET1_R, FILLET1_R), FILLET1_R, 180, 90)
            Line((2 + FILLET1_R, 0), (2, 0))
            Line((2, 0), (2, FILLET1_R))
        make_face()
    revolve(axis=Axis((14.171572875253808, -2, 15), (0, 0, -1)), revolution_arc=45.00000000000004, mode=Mode.SUBTRACT)


solid = part.part
